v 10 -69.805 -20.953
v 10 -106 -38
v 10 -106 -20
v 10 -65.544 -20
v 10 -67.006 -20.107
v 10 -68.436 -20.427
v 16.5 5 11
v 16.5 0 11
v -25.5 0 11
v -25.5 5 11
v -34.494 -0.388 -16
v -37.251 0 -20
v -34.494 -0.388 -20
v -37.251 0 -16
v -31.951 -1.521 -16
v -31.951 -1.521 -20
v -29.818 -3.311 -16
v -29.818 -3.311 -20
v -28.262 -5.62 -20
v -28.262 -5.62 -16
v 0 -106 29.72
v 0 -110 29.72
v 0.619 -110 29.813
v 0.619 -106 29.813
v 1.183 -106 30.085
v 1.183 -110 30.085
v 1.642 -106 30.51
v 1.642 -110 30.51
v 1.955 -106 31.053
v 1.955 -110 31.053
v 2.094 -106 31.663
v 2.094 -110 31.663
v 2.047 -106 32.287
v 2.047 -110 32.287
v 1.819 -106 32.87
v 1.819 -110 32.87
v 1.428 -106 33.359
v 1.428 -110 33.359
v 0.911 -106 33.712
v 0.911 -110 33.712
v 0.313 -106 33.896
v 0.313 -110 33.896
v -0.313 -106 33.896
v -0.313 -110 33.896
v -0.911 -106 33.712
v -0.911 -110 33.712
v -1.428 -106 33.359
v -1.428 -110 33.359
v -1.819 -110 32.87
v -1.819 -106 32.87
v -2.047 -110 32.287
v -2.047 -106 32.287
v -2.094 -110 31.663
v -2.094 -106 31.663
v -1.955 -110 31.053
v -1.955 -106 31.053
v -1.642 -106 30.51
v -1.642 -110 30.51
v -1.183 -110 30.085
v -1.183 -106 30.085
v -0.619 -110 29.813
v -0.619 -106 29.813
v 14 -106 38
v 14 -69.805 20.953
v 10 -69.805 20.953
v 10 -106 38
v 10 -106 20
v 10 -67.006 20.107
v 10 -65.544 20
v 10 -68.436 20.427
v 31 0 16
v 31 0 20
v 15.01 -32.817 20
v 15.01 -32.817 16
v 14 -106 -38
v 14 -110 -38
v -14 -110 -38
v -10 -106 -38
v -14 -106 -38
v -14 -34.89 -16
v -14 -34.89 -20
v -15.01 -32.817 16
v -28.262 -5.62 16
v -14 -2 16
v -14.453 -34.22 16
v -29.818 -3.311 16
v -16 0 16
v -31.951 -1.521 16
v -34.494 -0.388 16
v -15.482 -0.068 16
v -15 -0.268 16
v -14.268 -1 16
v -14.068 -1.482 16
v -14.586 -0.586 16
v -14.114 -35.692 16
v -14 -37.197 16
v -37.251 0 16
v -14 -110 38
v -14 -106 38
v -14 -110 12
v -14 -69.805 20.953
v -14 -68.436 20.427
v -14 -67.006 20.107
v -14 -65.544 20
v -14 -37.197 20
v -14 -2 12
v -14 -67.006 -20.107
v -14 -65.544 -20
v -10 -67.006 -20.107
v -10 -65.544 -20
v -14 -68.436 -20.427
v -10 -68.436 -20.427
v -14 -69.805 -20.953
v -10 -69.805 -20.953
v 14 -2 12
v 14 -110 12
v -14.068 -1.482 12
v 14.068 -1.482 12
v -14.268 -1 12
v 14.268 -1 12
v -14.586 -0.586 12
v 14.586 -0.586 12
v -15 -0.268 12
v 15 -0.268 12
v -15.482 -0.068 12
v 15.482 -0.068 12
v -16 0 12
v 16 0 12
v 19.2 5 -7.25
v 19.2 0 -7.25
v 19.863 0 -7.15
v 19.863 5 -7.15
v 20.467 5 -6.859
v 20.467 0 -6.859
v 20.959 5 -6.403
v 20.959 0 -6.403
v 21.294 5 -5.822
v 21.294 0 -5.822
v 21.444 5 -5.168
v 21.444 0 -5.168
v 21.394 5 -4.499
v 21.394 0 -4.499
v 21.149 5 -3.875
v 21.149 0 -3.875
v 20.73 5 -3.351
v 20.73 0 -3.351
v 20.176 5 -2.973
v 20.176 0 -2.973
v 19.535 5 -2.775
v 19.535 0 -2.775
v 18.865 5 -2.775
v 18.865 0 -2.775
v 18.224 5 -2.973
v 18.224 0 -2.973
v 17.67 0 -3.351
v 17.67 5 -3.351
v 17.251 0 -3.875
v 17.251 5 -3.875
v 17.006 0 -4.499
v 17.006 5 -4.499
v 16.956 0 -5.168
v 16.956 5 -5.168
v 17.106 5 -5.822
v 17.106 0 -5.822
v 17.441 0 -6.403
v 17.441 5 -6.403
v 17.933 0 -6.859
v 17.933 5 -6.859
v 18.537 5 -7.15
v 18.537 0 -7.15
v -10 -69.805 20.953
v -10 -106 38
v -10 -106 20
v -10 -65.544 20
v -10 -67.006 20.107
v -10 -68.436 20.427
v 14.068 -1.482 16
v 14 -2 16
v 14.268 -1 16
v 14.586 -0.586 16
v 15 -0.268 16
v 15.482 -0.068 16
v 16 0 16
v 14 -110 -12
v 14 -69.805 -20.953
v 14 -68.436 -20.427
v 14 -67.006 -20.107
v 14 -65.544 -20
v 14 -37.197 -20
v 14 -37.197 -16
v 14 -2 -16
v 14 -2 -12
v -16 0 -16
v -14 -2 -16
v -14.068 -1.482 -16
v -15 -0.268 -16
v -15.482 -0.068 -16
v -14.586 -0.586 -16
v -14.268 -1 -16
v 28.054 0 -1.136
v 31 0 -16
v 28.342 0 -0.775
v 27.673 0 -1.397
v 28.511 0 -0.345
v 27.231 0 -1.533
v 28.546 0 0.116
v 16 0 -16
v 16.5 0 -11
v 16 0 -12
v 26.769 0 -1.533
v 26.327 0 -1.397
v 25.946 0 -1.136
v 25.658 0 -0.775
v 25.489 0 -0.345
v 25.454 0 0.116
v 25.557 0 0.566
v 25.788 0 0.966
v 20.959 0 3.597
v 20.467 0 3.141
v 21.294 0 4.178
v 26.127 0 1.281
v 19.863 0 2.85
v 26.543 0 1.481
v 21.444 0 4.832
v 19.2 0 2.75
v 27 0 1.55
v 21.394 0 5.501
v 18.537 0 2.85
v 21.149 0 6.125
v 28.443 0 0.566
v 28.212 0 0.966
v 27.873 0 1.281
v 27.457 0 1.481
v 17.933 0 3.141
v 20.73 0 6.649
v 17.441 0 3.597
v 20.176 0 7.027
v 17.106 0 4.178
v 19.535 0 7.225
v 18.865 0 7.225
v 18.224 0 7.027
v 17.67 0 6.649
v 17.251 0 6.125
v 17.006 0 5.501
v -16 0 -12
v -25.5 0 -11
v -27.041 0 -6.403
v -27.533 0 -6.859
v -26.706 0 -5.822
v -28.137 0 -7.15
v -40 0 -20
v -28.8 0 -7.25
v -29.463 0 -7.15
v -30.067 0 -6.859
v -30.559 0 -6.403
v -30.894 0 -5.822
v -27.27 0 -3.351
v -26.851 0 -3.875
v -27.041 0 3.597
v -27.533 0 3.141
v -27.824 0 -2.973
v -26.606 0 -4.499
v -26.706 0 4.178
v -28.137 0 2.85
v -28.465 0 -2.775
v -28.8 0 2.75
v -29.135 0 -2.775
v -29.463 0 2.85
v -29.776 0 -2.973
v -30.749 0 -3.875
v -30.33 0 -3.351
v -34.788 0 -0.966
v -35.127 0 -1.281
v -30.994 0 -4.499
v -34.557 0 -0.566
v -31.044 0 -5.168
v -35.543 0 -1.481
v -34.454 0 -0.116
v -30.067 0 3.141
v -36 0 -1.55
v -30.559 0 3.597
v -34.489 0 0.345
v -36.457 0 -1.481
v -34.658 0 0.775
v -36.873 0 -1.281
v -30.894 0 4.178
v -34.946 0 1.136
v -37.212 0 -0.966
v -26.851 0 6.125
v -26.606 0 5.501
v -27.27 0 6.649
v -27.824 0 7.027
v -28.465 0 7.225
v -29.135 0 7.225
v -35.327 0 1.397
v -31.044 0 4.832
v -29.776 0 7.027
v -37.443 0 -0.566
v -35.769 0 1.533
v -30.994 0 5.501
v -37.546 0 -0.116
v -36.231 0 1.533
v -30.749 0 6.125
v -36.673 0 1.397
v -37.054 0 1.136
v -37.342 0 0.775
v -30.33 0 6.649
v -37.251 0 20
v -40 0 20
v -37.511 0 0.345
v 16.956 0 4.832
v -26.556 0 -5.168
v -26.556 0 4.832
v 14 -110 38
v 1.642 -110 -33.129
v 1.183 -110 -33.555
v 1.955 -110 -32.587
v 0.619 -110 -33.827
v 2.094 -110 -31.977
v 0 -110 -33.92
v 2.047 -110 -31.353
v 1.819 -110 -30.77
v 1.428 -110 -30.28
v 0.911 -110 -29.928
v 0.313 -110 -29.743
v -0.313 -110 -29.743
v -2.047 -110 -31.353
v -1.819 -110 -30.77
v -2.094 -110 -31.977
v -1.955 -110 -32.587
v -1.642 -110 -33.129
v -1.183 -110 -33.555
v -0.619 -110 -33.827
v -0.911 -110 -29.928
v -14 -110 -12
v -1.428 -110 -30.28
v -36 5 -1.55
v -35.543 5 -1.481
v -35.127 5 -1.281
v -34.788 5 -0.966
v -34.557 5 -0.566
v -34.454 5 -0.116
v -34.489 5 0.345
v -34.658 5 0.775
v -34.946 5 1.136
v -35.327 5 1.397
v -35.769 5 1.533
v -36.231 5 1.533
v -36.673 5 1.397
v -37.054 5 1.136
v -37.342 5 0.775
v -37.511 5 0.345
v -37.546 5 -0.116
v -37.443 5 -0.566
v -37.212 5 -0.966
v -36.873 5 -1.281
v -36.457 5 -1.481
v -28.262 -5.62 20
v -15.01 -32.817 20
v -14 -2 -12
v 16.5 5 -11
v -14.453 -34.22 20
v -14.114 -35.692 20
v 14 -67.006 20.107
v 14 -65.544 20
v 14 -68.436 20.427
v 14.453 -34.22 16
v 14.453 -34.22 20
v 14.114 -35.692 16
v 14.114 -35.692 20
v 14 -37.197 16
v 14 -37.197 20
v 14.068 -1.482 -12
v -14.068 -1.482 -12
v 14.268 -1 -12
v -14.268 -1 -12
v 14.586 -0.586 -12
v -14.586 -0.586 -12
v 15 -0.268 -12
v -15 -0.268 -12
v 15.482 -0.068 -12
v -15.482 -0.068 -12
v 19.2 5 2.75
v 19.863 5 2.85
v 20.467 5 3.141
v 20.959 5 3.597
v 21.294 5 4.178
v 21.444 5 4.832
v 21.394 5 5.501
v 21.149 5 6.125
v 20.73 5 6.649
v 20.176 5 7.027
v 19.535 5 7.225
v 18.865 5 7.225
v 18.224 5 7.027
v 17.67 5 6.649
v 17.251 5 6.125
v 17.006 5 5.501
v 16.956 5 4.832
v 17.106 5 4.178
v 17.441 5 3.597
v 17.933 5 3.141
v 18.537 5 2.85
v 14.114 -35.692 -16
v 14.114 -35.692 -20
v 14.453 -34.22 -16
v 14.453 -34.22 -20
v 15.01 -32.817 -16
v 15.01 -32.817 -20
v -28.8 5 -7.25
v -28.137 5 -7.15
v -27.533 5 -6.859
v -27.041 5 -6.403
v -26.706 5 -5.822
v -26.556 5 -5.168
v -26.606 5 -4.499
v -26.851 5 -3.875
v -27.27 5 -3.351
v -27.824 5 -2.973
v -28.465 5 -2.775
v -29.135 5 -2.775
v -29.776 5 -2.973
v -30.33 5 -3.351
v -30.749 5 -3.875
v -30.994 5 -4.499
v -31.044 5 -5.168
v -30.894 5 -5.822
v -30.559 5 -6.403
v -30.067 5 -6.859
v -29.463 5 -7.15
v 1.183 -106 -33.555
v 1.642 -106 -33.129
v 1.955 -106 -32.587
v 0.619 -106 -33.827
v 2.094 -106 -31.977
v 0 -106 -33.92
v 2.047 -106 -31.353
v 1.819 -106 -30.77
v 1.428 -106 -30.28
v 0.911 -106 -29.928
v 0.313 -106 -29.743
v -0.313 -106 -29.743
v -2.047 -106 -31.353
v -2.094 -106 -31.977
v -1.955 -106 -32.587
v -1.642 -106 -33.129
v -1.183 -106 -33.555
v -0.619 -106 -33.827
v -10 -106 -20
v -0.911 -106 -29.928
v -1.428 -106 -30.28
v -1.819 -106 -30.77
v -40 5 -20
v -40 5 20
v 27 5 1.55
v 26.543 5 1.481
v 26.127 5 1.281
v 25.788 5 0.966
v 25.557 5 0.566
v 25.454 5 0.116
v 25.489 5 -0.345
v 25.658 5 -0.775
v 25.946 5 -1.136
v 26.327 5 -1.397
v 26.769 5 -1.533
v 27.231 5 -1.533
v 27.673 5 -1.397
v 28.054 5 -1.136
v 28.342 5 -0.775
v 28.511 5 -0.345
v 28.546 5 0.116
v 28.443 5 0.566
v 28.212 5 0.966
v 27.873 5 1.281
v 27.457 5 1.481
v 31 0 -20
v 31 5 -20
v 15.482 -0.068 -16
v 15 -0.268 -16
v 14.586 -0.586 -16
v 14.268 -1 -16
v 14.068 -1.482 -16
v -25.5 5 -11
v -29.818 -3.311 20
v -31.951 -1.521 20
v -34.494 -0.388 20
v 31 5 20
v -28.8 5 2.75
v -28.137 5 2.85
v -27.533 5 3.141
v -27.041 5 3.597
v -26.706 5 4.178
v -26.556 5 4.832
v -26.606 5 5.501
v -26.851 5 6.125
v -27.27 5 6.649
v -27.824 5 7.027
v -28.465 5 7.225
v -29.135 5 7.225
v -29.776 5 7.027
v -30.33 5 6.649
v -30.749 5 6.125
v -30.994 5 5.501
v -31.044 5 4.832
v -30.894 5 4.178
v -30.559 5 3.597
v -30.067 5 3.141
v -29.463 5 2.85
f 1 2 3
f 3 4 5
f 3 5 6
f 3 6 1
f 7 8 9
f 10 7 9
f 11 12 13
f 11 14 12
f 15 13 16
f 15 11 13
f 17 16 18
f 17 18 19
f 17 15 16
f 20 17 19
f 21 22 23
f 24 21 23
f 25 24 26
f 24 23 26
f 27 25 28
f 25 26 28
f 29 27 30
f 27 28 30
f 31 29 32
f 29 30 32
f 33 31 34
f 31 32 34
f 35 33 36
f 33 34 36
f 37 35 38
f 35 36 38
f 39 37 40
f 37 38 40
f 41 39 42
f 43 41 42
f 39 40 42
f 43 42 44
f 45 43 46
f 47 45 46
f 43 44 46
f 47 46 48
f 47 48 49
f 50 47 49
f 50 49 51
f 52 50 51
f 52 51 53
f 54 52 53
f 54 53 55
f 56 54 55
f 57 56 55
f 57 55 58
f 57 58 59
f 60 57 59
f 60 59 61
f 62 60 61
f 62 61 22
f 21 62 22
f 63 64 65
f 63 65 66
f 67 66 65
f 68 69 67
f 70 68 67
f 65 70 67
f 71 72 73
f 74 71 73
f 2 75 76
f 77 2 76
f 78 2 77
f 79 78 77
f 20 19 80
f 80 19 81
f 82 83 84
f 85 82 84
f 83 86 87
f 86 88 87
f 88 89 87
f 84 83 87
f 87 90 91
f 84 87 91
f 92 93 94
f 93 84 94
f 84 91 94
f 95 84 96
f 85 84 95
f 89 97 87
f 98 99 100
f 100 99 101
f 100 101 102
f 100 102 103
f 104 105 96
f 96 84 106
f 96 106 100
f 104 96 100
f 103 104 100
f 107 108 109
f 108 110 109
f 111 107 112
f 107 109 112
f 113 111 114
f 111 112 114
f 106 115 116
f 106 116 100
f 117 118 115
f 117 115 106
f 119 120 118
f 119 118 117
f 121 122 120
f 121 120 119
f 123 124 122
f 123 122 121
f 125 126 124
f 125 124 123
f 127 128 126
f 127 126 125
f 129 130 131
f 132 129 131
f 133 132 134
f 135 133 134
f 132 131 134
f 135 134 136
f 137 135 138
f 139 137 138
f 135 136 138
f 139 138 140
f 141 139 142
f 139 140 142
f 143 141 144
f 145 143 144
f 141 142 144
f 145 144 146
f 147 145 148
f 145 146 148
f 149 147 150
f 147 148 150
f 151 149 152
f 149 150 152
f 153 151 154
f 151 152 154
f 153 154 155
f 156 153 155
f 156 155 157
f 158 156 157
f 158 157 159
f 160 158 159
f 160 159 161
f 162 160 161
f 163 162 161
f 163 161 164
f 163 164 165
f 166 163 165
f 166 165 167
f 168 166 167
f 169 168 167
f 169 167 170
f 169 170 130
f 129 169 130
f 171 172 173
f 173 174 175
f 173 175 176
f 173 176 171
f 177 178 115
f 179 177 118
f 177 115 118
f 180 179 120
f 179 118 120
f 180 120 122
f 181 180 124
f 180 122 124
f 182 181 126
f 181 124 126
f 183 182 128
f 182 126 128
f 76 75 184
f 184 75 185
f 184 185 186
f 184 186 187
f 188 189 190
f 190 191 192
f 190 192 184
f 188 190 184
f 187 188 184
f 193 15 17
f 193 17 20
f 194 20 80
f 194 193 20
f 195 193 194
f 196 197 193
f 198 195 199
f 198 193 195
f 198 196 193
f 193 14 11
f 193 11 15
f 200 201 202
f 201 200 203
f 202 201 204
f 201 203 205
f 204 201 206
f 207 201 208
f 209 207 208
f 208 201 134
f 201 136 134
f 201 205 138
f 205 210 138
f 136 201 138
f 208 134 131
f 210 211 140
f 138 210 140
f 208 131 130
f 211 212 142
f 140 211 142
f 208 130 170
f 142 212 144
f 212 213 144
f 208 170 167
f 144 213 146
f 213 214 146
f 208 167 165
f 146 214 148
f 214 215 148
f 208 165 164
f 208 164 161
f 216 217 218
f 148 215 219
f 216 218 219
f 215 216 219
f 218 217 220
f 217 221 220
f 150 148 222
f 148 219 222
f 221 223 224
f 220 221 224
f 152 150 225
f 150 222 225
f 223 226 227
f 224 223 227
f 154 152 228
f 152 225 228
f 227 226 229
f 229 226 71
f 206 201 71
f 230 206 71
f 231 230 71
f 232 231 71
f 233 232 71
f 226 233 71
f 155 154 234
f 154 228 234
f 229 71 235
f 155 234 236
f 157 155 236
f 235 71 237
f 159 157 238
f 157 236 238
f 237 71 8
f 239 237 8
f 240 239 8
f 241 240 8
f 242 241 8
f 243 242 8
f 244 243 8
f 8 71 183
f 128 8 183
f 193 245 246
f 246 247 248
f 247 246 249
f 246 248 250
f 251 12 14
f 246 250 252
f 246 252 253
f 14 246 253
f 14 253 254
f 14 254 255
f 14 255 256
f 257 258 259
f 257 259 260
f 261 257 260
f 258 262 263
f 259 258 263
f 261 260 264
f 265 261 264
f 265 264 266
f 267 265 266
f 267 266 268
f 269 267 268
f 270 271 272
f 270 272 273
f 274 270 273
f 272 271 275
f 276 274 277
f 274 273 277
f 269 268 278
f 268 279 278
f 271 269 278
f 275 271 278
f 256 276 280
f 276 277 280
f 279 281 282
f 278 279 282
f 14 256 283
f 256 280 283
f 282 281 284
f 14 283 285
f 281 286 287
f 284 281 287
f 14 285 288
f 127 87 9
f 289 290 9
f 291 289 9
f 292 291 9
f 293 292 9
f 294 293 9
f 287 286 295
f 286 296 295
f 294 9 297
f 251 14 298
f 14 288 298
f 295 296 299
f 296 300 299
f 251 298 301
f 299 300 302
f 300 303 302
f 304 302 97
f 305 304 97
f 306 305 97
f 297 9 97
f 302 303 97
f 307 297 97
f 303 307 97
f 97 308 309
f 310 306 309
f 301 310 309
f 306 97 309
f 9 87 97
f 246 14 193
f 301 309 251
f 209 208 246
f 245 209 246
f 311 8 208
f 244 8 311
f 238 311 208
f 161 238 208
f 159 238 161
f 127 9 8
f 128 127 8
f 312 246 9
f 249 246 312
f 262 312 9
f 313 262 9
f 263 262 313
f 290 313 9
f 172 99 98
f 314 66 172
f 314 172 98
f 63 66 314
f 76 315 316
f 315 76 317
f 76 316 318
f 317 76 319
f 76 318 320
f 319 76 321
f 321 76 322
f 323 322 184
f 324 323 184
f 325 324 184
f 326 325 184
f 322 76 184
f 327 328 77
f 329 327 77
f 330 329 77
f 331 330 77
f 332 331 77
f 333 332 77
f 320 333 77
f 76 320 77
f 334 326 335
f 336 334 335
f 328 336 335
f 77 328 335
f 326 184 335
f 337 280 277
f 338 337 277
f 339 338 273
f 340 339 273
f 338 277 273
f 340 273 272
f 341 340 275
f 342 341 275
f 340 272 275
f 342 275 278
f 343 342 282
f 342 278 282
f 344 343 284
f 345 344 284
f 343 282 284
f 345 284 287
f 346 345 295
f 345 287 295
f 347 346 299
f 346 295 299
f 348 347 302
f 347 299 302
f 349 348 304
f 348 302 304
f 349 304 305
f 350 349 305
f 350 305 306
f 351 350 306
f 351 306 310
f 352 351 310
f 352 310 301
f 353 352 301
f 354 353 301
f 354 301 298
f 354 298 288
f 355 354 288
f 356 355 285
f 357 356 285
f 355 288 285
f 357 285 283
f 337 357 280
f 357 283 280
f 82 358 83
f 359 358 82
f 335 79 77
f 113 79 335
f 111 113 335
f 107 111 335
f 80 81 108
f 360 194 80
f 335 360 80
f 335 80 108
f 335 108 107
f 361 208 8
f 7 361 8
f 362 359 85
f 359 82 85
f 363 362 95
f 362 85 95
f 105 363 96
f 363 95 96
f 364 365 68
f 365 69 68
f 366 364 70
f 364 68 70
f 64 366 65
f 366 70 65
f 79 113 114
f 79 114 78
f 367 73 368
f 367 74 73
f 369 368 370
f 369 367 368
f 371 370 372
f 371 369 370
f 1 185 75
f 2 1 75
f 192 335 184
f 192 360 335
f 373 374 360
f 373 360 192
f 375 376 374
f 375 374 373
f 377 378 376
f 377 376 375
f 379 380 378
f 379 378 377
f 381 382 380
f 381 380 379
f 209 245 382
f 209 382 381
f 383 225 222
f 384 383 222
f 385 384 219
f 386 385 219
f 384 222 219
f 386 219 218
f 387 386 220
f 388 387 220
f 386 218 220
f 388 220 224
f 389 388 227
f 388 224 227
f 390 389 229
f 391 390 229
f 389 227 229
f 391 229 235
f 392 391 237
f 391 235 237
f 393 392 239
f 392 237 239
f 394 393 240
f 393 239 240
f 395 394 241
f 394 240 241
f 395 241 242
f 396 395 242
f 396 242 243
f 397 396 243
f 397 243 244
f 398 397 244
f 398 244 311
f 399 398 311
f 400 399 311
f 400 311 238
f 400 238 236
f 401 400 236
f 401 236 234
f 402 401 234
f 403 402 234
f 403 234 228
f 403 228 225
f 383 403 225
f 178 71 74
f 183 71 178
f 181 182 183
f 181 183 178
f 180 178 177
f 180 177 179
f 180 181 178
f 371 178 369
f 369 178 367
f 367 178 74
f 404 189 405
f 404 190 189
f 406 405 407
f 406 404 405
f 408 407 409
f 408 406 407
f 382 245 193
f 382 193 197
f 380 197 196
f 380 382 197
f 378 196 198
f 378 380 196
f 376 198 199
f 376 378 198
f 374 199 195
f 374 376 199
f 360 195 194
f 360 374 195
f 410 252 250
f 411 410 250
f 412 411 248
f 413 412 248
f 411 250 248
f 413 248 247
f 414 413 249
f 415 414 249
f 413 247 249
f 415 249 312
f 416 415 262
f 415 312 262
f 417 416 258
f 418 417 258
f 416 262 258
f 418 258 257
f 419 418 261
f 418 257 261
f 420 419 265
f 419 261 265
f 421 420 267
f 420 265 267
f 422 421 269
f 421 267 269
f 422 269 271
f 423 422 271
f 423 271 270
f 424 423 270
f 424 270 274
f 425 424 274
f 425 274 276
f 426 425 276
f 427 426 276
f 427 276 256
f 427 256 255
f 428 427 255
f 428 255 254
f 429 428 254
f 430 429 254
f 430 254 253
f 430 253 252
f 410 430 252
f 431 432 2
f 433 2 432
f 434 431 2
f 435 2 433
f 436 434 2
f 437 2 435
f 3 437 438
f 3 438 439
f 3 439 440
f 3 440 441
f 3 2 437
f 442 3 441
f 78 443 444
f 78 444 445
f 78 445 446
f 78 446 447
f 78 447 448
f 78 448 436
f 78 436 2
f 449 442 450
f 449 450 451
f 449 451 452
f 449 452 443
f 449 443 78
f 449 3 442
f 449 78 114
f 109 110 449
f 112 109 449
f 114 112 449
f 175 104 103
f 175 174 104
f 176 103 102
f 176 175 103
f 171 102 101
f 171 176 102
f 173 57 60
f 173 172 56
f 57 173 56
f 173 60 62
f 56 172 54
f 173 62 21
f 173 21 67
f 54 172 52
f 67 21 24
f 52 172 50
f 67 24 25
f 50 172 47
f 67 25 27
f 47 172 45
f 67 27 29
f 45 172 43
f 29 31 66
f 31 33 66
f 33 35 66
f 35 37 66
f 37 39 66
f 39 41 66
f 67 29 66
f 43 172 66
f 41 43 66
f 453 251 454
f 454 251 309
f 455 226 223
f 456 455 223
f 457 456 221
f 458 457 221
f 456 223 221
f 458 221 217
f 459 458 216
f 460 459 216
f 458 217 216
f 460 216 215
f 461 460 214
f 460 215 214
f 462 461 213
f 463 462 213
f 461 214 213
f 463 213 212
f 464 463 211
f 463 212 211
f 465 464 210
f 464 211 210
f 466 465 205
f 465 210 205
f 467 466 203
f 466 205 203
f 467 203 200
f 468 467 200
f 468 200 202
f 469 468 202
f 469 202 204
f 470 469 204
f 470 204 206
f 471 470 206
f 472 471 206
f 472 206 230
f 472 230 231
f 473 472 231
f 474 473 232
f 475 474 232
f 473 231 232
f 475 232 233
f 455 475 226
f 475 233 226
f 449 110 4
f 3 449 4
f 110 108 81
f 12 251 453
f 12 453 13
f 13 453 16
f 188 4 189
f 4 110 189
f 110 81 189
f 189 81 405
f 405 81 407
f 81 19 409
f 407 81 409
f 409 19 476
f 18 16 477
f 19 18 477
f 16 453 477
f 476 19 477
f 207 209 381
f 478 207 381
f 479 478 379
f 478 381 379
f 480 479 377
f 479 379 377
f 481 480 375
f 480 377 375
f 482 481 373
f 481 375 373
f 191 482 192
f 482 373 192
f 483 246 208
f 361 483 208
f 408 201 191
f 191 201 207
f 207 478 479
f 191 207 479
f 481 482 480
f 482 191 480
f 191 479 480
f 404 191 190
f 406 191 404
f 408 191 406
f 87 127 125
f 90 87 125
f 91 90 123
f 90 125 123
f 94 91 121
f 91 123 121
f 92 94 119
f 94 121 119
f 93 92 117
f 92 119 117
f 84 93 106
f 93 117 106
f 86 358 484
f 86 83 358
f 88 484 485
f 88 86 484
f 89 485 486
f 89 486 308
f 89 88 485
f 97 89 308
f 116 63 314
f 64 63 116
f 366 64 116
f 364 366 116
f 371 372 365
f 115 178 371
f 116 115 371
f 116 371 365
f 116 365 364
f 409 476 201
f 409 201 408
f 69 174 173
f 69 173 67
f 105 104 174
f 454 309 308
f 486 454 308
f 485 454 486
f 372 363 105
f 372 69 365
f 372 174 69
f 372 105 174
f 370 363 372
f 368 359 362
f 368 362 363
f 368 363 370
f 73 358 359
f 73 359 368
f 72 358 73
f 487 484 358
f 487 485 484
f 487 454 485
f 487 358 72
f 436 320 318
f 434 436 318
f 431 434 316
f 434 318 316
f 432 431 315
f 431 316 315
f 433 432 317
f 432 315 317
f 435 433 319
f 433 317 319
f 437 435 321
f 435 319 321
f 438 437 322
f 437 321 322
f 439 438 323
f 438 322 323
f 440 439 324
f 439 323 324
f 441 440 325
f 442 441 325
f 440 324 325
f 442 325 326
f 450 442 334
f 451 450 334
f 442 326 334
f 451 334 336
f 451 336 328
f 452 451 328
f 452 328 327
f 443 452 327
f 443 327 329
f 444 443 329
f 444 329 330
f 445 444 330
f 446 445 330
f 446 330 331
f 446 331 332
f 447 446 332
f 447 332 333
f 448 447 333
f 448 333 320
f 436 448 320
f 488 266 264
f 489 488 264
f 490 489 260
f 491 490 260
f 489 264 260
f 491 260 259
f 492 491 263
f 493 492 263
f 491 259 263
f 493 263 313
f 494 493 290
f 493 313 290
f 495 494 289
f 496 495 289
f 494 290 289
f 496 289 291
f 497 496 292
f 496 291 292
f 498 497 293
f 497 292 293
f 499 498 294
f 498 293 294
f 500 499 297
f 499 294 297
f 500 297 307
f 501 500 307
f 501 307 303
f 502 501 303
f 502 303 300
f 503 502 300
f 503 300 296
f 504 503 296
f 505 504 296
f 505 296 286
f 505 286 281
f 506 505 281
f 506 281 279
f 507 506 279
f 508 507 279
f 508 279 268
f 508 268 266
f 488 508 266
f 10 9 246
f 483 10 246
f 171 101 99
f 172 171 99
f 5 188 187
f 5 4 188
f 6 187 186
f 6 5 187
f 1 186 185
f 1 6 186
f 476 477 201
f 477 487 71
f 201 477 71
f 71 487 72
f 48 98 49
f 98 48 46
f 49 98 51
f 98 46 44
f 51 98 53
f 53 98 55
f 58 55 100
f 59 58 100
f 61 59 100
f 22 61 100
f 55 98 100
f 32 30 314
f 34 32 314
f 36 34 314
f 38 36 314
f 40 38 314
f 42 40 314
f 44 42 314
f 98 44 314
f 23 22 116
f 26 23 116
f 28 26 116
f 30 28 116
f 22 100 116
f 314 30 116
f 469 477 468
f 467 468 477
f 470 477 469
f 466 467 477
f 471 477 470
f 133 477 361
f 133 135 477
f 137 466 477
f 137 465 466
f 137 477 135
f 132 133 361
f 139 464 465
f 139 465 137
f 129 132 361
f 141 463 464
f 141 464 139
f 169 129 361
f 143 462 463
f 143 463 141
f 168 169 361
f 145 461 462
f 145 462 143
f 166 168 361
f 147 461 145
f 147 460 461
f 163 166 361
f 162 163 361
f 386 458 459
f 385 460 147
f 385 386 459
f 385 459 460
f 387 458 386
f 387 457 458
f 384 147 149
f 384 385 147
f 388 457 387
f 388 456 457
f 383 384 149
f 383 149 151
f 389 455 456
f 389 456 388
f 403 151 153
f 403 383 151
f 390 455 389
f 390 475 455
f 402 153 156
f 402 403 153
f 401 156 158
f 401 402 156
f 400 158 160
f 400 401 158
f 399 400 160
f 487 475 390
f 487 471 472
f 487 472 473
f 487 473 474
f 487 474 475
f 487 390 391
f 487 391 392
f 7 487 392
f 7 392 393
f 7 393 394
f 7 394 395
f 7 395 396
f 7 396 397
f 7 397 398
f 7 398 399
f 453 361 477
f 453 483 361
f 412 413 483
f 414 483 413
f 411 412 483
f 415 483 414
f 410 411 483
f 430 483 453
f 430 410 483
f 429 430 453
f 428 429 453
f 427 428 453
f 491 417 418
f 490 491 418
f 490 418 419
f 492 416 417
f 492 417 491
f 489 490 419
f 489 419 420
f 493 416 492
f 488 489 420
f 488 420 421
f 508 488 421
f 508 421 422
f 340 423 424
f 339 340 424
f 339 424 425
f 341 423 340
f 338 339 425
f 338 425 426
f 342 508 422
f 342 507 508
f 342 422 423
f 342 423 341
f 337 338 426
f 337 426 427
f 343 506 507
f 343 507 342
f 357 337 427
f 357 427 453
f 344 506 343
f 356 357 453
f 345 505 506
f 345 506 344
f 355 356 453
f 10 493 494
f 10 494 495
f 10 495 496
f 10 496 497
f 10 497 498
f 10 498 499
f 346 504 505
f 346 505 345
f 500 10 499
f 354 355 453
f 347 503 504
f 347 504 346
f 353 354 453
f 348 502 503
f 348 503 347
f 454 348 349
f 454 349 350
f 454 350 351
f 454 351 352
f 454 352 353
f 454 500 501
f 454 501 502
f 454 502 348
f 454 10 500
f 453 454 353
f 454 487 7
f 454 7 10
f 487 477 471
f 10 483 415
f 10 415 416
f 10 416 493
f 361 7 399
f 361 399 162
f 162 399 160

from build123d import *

# Parameters (mm, degrees)
SKETCH_1_W                                = 36
SKETCH_1_H                                = 30
EXTRUDE_1_DEPTH                           = 5
SKETCH_11_W                               = 36
SKETCH_11_H                               = 8
EXTRUDE_3_DEPTH                           = 110
SKETCH_12_W                               = 36
SKETCH_12_H                               = 8
EXTRUDE_4_DEPTH                           = 4
SKETCH_17_W                               = 36
SKETCH_17_H                               = 5
EXTRUDE_5_DEPTH                           = 8
SKETCH_18_W                               = 36
SKETCH_18_H                               = 5
EXTRUDE_6_DEPTH                           = 8
SKETCH_20_W                               = 36
SKETCH_20_H                               = 4
EXTRUDE_7_DEPTH                           = 15
SKETCH_21_W                               = 36
SKETCH_21_H                               = 4
EXTRUDE_8_DEPTH                           = 15
CUT_EXTRUDE_8_REACH                       = 124.446
SKETCH_22_R                               = 2.1
CUT_EXTRUDE_9_REACH                       = 124.446
SKETCH_23_R                               = 1.55
CUT_EXTRUDE_10_REACH                      = 119.762
SKETCH_26_R                               = 1
SKETCH_26_W                               = 23.5
SKETCH_26_H                               = 12
CUT_EXTRUDE_11_DEPTH                      = 2
CUT_EXTRUDE_12_DEPTH                      = 2
CUT_EXTRUDE_13_DEPTH                      = 2
CUT_EXTRUDE_14_DEPTH                      = 2
SKETCH_32_W                               = 28
SKETCH_32_H                               = 106
CUT_EXTRUDE_15_DEPTH                      = 2
SKETCH_33_W                               = 28
SKETCH_33_H                               = 106
CUT_EXTRUDE_16_DEPTH                      = 2
EXTRUDE_START                             = 2
SKETCH_34_W                               = 32
SKETCH_34_H                               = 14.000594261
SKETCH_34_R                               = 1
SKETCH_34_W_2                             = 23.5
SKETCH_34_H_2                             = 12
EXTRUDE_12_DEPTH                          = 2
CUT_EXTRUDE_START                         = -2
CUT_EXTRUDE_17_OUTLINE_R                  = 1
CUT_EXTRUDE_17_OUTLINE_W                  = 23.5
CUT_EXTRUDE_17_OUTLINE_H                  = 12
CUT_EXTRUDE_17_DEPTH                      = 2
SKETCH_36_W                               = 46
SKETCH_36_H                               = 5
EXTRUDE_13_DEPTH                          = 15
SKETCH_37_W                               = 46
SKETCH_37_H                               = 5
EXTRUDE_14_DEPTH                          = 15
SKETCH_38_R                               = 1.55
CUT_EXTRUDE_18_DEPTH                      = 5
CUT_EXTRUDE_19_REACH                      = 122.437
SKETCH_39_W                               = 62
SKETCH_39_H                               = 10
FILLET_3_R                                = 2
EXTRUDE_15_DEPTH                          = 7
EXTRUDE_16_DEPTH                          = 7
CUT_EXTRUDE_20_DEPTH                      = 5
CUT_EXTRUDE_21_DEPTH                      = 5
CUT_EXTRUDE_22_DEPTH                      = 5
SKETCH_46_W                               = 9
SKETCH_46_H                               = 40
SKETCH_46_R                               = 1.55
EXTRUDE_17_DEPTH                          = 5
EXTRUDE_18_DEPTH                          = 5
SKETCH_48_R                               = 2.25
CUT_EXTRUDE_23_DEPTH                      = 10
EXTRUDE_19_DEPTH                          = 4
MIRROR_1_AT_THE_SECOND_PLANE_COPY_1_DEPTH = 4
EXTRUDE_20_DEPTH                          = 4
MIRROR_2_AT_THE_SECOND_PLANE_COPY_1_DEPTH = 4
FILLET_4_R                                = 10


# Read off the part's stored shape, not the designer's step: 切除-拉伸17
with BuildPart() as part:
    # 草图1 → 凸台-拉伸1 (new body)
    with BuildSketch(Plane(origin=(0, 0, 0), x_dir=(1, 0, 0), z_dir=(0, 1, 0))):
        Rectangle(SKETCH_1_W, SKETCH_1_H)
    extrude(amount=EXTRUDE_1_DEPTH)

    # 草图11 → 凸台-拉伸3 (add)
    with BuildSketch(Plane.XZ):
        with Locations((0, 11)):
            Rectangle(SKETCH_11_W, SKETCH_11_H)
        with Locations((0, -11)):
            Rectangle(SKETCH_11_W, SKETCH_11_H)
    extrude(amount=EXTRUDE_3_DEPTH)

    # 草图12 → 凸台-拉伸4 (add)
    with BuildSketch(Plane.XZ.offset(110)):
        with Locations((0, 19)):
            Rectangle(SKETCH_12_W, SKETCH_12_H)
        with Locations((0, -19)):
            Rectangle(SKETCH_12_W, SKETCH_12_H)
    extrude(amount=-EXTRUDE_4_DEPTH)

    # 草图17 → 凸台-拉伸5 (add)
    with BuildSketch(Plane(origin=(0, 0, -15), x_dir=(-1, 0, 0), z_dir=(0, 0, -1))):
        with Locations((0, 2.5)):
            Rectangle(SKETCH_17_W, SKETCH_17_H)
    extrude(amount=EXTRUDE_5_DEPTH)

    # 草图18 → 凸台-拉伸6 (add)
    with BuildSketch(Plane.XY.offset(15)):
        with Locations((0, 2.5)):
            Rectangle(SKETCH_18_W, SKETCH_18_H)
    extrude(amount=EXTRUDE_6_DEPTH)

    # 草图20 → 凸台-拉伸7 (add)
    with BuildSketch(Plane.XY.offset(23)):
        with Locations((0, -108)):
            Rectangle(SKETCH_20_W, SKETCH_20_H)
    extrude(amount=EXTRUDE_7_DEPTH)

    # 草图21 → 凸台-拉伸8 (add)
    with BuildSketch(Plane(origin=(0, 0, -23), x_dir=(-1, 0, 0), z_dir=(0, 0, -1))):
        with Locations((0, -108)):
            Rectangle(SKETCH_21_W, SKETCH_21_H)
    extrude(amount=EXTRUDE_8_DEPTH)

    # 草图22 → 切除-拉伸8 (cut, up to next)
    with BuildSketch(Plane.XZ.offset(110), mode=Mode.PRIVATE) as cut_extrude_8_sk1:
        with Locations(Location((0, 31.819805155, 0), (0, 0, 270))):
            Circle(SKETCH_22_R)
    cut_extrude_8_tool1 = extrude(cut_extrude_8_sk1.sketch, amount=-CUT_EXTRUDE_8_REACH, mode=Mode.PRIVATE) & part.part
    # 草图22 → 切除-拉伸8 (cut, up to next)
    with BuildSketch(Plane.XZ.offset(110), mode=Mode.PRIVATE) as cut_extrude_8_sk2:
        with Locations(Location((0, -31.819805155, 0), (0, 0, 270))):
            Circle(SKETCH_22_R)
    cut_extrude_8_tool2 = extrude(cut_extrude_8_sk2.sketch, amount=-CUT_EXTRUDE_8_REACH, mode=Mode.PRIVATE) & part.part
    add(cut_extrude_8_tool1.solids().sort_by_distance((0, -110, 31.819805))[0], mode=Mode.SUBTRACT)
    add(cut_extrude_8_tool2.solids().sort_by_distance((0, -110, -31.819805))[0], mode=Mode.SUBTRACT)

    # 草图23 → 切除-拉伸9 (cut, up to next)
    with BuildSketch(Plane(origin=(0, 5, 0), x_dir=(1, 0, 0), z_dir=(0, 1, 0)), mode=Mode.PRIVATE) as cut_extrude_9_sk1:
        with Locations(Location((0, 18, 0), (0, 0, 270))):
            Circle(SKETCH_23_R)
    cut_extrude_9_tool1 = extrude(cut_extrude_9_sk1.sketch, amount=-CUT_EXTRUDE_9_REACH, mode=Mode.PRIVATE) & part.part
    # 草图23 → 切除-拉伸9 (cut, up to next)
    with BuildSketch(Plane(origin=(0, 5, 0), x_dir=(1, 0, 0), z_dir=(0, 1, 0)), mode=Mode.PRIVATE) as cut_extrude_9_sk2:
        with Locations(Location((0, -18, 0), (0, 0, 270))):
            Circle(SKETCH_23_R)
    cut_extrude_9_tool2 = extrude(cut_extrude_9_sk2.sketch, amount=-CUT_EXTRUDE_9_REACH, mode=Mode.PRIVATE) & part.part
    add(cut_extrude_9_tool1.solids().sort_by_distance((0, 5, -18))[0], mode=Mode.SUBTRACT)
    add(cut_extrude_9_tool2.solids().sort_by_distance((0, 5, 18))[0], mode=Mode.SUBTRACT)

    # 草图26 → 切除-拉伸10 (cut, up to next)
    with BuildSketch(Plane(origin=(0, 0, 0), x_dir=(-1, 0, 0), z_dir=(0, -1, 0)), mode=Mode.PRIVATE) as cut_extrude_10_sk1:
        with Locations(Location((-14, 0, 0), (0, 0, 90))):
            Circle(SKETCH_26_R)
    cut_extrude_10_tool1 = extrude(cut_extrude_10_sk1.sketch, amount=-CUT_EXTRUDE_10_REACH, mode=Mode.PRIVATE) & part.part
    # 草图26 → 切除-拉伸10 (cut, up to next)
    with BuildSketch(Plane(origin=(0, 0, 0), x_dir=(-1, 0, 0), z_dir=(0, -1, 0)), mode=Mode.PRIVATE) as cut_extrude_10_sk2:
        with Locations(Location((14, 0, 0), (0, 0, 270))):
            Circle(SKETCH_26_R)
    cut_extrude_10_tool2 = extrude(cut_extrude_10_sk2.sketch, amount=-CUT_EXTRUDE_10_REACH, mode=Mode.PRIVATE) & part.part
    # 草图26 → 切除-拉伸10 (cut, up to next)
    with BuildSketch(Plane(origin=(0, 0, 0), x_dir=(-1, 0, 0), z_dir=(0, -1, 0)), mode=Mode.PRIVATE) as cut_extrude_10_sk3:
        Rectangle(SKETCH_26_W, SKETCH_26_H)
    cut_extrude_10_tool3 = extrude(cut_extrude_10_sk3.sketch, amount=-CUT_EXTRUDE_10_REACH, mode=Mode.PRIVATE) & part.part
    add(cut_extrude_10_tool1.solids().sort_by_distance((14, 0, 0))[0], mode=Mode.SUBTRACT)
    add(cut_extrude_10_tool2.solids().sort_by_distance((-14, 0, 0))[0], mode=Mode.SUBTRACT)
    add(cut_extrude_10_tool3.solids().sort_by_distance((0, 0, 0))[0], mode=Mode.SUBTRACT)

    # 草图28 → 切除-拉伸11 (cut)
    with BuildSketch(Plane(origin=(18, 0, 0), x_dir=(0, 0, -1), z_dir=(1, 0, 0))):
        Polygon((23, 5), (-23, 5), (-23, 0), (-15, 0), (-15, -106), (-38, -106), (-38, -110), (-7, -110), (-7, 0), (7, 0), (7, -110), (38, -110), (38, -106), (15, -106), (15, 0), (23, 0), align=None)
    extrude(amount=-CUT_EXTRUDE_11_DEPTH, mode=Mode.SUBTRACT)

    # 草图29 → 切除-拉伸12 (cut)
    with BuildSketch(Plane.ZY.offset(18)):
        Polygon((23, 5), (-23, 5), (-23, 0), (-15, 0), (-15, -106), (-38, -106), (-38, -110), (-7, -110), (-7, 0), (7, 0), (7, -110), (38, -110), (38, -106), (15, -106), (15, 0), (23, 0), align=None)
    extrude(amount=-CUT_EXTRUDE_12_DEPTH, mode=Mode.SUBTRACT)

    # 草图30 → 切除-拉伸13 (cut)
    with BuildSketch(Plane(origin=(16, 0, 0), x_dir=(0, 0, -1), z_dir=(1, 0, 0))):
        Polygon((-15, 0), (-7, 0), (-7, -110), (-38, -110), (-38, -106), (-15, -106), align=None)
        Polygon((7, 0), (15, 0), (15, -106), (38, -106), (38, -110), (7, -110), align=None)
    extrude(amount=-CUT_EXTRUDE_13_DEPTH, mode=Mode.SUBTRACT)

    # 草图31 → 切除-拉伸14 (cut)
    with BuildSketch(Plane.ZY.offset(16)):
        Polygon((-7, 0), (-7, -110), (-38, -110), (-38, -106), (-15, -106), (-15, 0), align=None)
        Polygon((15, 0), (15, -106), (38, -106), (38, -110), (7, -110), (7, 0), align=None)
    extrude(amount=-CUT_EXTRUDE_14_DEPTH, mode=Mode.SUBTRACT)

    # 草图32 → 切除-拉伸15 (cut)
    with BuildSketch(Plane.XY.offset(15)):
        with Locations((0, -53)):
            Rectangle(SKETCH_32_W, SKETCH_32_H)
    extrude(amount=-CUT_EXTRUDE_15_DEPTH, mode=Mode.SUBTRACT)

    # 草图33 → 切除-拉伸16 (cut)
    with BuildSketch(Plane(origin=(0, 0, -15), x_dir=(-1, 0, 0), z_dir=(0, 0, -1))):
        with Locations((0, -53)):
            Rectangle(SKETCH_33_W, SKETCH_33_H)
    extrude(amount=-CUT_EXTRUDE_16_DEPTH, mode=Mode.SUBTRACT)

    # 草图34 → 凸台-拉伸12 (add)
    with BuildSketch(Plane.XZ.offset(EXTRUDE_START)):
        with Locations((0, 0.000297131)):
            Rectangle(SKETCH_34_W, SKETCH_34_H)
        with Locations(Location((14, 0, 0), (0, 0, 270))):
            Circle(SKETCH_34_R, mode=Mode.SUBTRACT)
        with Locations(Location((-14, 0, 0), (0, 0, 270))):
            Circle(SKETCH_34_R, mode=Mode.SUBTRACT)
        Rectangle(SKETCH_34_W_2, SKETCH_34_H_2, mode=Mode.SUBTRACT)
    extrude(amount=-EXTRUDE_12_DEPTH)

    # 切除-拉伸17 outline → 切除-拉伸17 (cut)
    with BuildSketch(Plane.XZ.offset(2).offset(CUT_EXTRUDE_START)):
        Polygon((-16, -7), (16, -7), (16, 7.000594261), (14, 7.000594261), (14, 7), (-14, 7), (-14, 7.000594261), (-16, 7.000594261), align=None)
        with Locations((-14, 0)):
            Circle(CUT_EXTRUDE_17_OUTLINE_R, mode=Mode.SUBTRACT)
        Rectangle(CUT_EXTRUDE_17_OUTLINE_W, CUT_EXTRUDE_17_OUTLINE_H, mode=Mode.SUBTRACT)
        with Locations((14, 0)):
            Circle(CUT_EXTRUDE_17_OUTLINE_R, mode=Mode.SUBTRACT)
    extrude(amount=CUT_EXTRUDE_17_DEPTH, mode=Mode.SUBTRACT)

    # 草图36 → 凸台-拉伸13 (add)
    with BuildSketch(Plane.ZY.offset(16)):
        with Locations((0, 2.5)):
            Rectangle(SKETCH_36_W, SKETCH_36_H)
    extrude(amount=EXTRUDE_13_DEPTH)

    # 草图37 → 凸台-拉伸14 (add)
    with BuildSketch(Plane(origin=(16, 0, 0), x_dir=(0, 0, -1), z_dir=(1, 0, 0))):
        with Locations((0, 2.5)):
            Rectangle(SKETCH_37_W, SKETCH_37_H)
    extrude(amount=EXTRUDE_14_DEPTH)

    # 草图38 → 切除-拉伸18 (cut)
    with BuildSketch(Plane.XZ):
        with Locations(Location((-27, 0, 0), (0, 0, 270))):
            Circle(SKETCH_38_R)
        with Locations(Location((27, 0, 0), (0, 0, 90))):
            Circle(SKETCH_38_R)
    extrude(amount=-CUT_EXTRUDE_18_DEPTH, mode=Mode.SUBTRACT)

    # 草图39 → 切除-拉伸19 (cut, up to next)
    with BuildSketch(Plane.XZ, mode=Mode.PRIVATE) as cut_extrude_19_sk1:
        with Locations((0, 18)):
            Rectangle(SKETCH_39_W, SKETCH_39_H)
    cut_extrude_19_tool1 = extrude(cut_extrude_19_sk1.sketch, amount=-CUT_EXTRUDE_19_REACH, mode=Mode.PRIVATE) & part.part
    # 草图39 → 切除-拉伸19 (cut, up to next)
    with BuildSketch(Plane.XZ, mode=Mode.PRIVATE) as cut_extrude_19_sk2:
        with Locations((0, -18)):
            Rectangle(SKETCH_39_W, SKETCH_39_H)
    cut_extrude_19_tool2 = extrude(cut_extrude_19_sk2.sketch, amount=-CUT_EXTRUDE_19_REACH, mode=Mode.PRIVATE) & part.part
    add(cut_extrude_19_tool1.solids().sort_by_distance((0, 0, 18))[0], mode=Mode.SUBTRACT)
    add(cut_extrude_19_tool2.solids().sort_by_distance((0, 0, -18))[0], mode=Mode.SUBTRACT)

    # 圆角3
    fillet_3_edges = [part.edges().sort_by_distance(p)[0] for p in [
        (-14, 0, -10),
        (-14, 0, 10),
        (14, 0, -10),
        (14, 0, 10),
    ]]
    fillet(fillet_3_edges, radius=FILLET_3_R)

    # 草图40 → 凸台-拉伸15 (add)
    with BuildSketch(Plane.XY.offset(13)):
        with BuildLine():
            Line((14, -106), (14, -2))
            ThreePointArc((14, -2), (14.585786438, -0.585786438), (16, 0))
            Line((16, 0), (31, 0))
            Line((31, 0), (31, 5))
            Line((31, 5), (-31, 5))
            Line((-31, 5), (-31, 0))
            Line((-31, 0), (-16, 0))
            ThreePointArc((-16, 0), (-14.585786438, -0.585786438), (-14, -2))
            Line((-14, -2), (-14, -106))
            Line((-14, -106), (14, -106))
        make_face()
    extrude(amount=EXTRUDE_15_DEPTH)

    # 草图41 → 凸台-拉伸16 (add)
    with BuildSketch(Plane(origin=(0, 0, -13), x_dir=(-1, 0, 0), z_dir=(0, 0, -1))):
        with BuildLine():
            Line((-31, 0), (-16, 0))
            ThreePointArc((-16, 0), (-14.585786438, -0.585786438), (-14, -2))
            Line((-14, -2), (-14, -106))
            Line((-14, -106), (14, -106))
            Line((14, -106), (14, -2))
            ThreePointArc((14, -2), (14.585786438, -0.585786438), (16, 0))
            Line((16, 0), (31, 0))
            Line((31, 0), (31, 5))
            Line((31, 5), (-31, 5))
            Line((-31, 5), (-31, 0))
        make_face()
    extrude(amount=EXTRUDE_16_DEPTH)

    # 草图42 → 切除-拉伸20 (cut)
    with BuildSketch(Plane(origin=(0, 0, 7), x_dir=(-1, 0, 0), z_dir=(0, 0, -1))):
        with BuildLine():
            Line((14, -110), (14, -2))
            ThreePointArc((14, -2), (14.585786438, -0.585786438), (16, 0))
            Line((16, 0), (-16, 0))
            ThreePointArc((-16, 0), (-14.585786438, -0.585786438), (-14, -2))
            Line((-14, -2), (-14, -110))
            Line((-14, -110), (14, -110))
        make_face()
    extrude(amount=-CUT_EXTRUDE_20_DEPTH, mode=Mode.SUBTRACT)

    # 草图43 → 切除-拉伸21 (cut)
    with BuildSketch(Plane.XY.offset(-7)):
        with BuildLine():
            Line((-14, -110), (14, -110))
            Line((14, -110), (14, -2))
            ThreePointArc((14, -2), (14.585786438, -0.585786438), (16, 0))
            Line((16, 0), (-16, 0))
            ThreePointArc((-16, 0), (-14.585786438, -0.585786438), (-14, -2))
            Line((-14, -2), (-14, -110))
        make_face()
    extrude(amount=-CUT_EXTRUDE_21_DEPTH, mode=Mode.SUBTRACT)

    # 草图45 → 切除-拉伸22 (cut)
    with BuildSketch(Plane.XZ):
        with BuildLine():
            Line((-25.5, -11), (16.5, -11))
            Line((16.5, -11), (16.5, 0))
            Line((16.5, 0), (15, 0))
            ThreePointArc((15, 0), (14, -1), (13, 0))
            Line((13, 0), (11.75, 0))
            Line((11.75, 0), (11.75, -6))
            Line((11.75, -6), (-11.75, -6))
            Line((-11.75, -6), (-11.75, 0))
            Line((-11.75, 0), (-13, 0))
            ThreePointArc((-13, 0), (-14, -1), (-15, 0))
            Line((-15, 0), (-25.45, 0))
            ThreePointArc((-25.45, 0), (-25.462550814, -0.196850197), (-25.5, -0.390512484))
            Line((-25.5, -0.390512484), (-25.5, -11))
        make_face()
        with BuildLine():
            Line((15, 0), (16.5, 0))
            Line((16.5, 0), (16.5, 11))
            Line((16.5, 11), (-25.5, 11))
            Line((-25.5, 11), (-25.5, 0.390512484))
            ThreePointArc((-25.5, 0.390512484), (-25.462550814, 0.196850197), (-25.45, 0))
            Line((-25.45, 0), (-15, 0))
            ThreePointArc((-15, 0), (-14, 1), (-13, 0))
            Line((-13, 0), (-11.75, 0))
            Line((-11.75, 0), (-11.75, 6))
            Line((-11.75, 6), (11.75, 6))
            Line((11.75, 6), (11.75, 0))
            Line((11.75, 0), (13, 0))
            ThreePointArc((13, 0), (14, 1), (15, 0))
        make_face()
    extrude(amount=-CUT_EXTRUDE_22_DEPTH, mode=Mode.SUBTRACT)

    # 草图46 → 凸台-拉伸17 (add)
    with BuildSketch(Plane.XZ):
        with Locations((-35.5, 0)):
            Rectangle(SKETCH_46_W, SKETCH_46_H)
        with Locations(Location((-36, 0, 0), (0, 0, 270))):
            Circle(SKETCH_46_R, mode=Mode.SUBTRACT)
    extrude(amount=-EXTRUDE_17_DEPTH)

    # 草图47 → 凸台-拉伸18 (add)
    with BuildSketch(Plane.XZ):
        with BuildLine():
            Line((-25.5, 0.390512484), (-25.5, -0.390512484))
            ThreePointArc((-25.5, -0.390512484), (-28.55, 0), (-25.5, 0.390512484))
        make_face()
    extrude(amount=-EXTRUDE_18_DEPTH)

    # 草图48 → 切除-拉伸23 (cut)
    with BuildSketch(Plane.XZ):
        with Locations(Location((-28.8, 5, 0), (0, 0, 270))):
            Circle(SKETCH_48_R)
        with Locations(Location((-28.8, -5, 0), (0, 0, 270))):
            Circle(SKETCH_48_R)
        with Locations(Location((19.2, 5, 0), (0, 0, 270))):
            Circle(SKETCH_48_R)
        with Locations(Location((19.2, -5, 0), (0, 0, 270))):
            Circle(SKETCH_48_R)
    extrude(amount=-CUT_EXTRUDE_23_DEPTH, mode=Mode.SUBTRACT)

    # 草图49 → 凸台-拉伸19 (add)
    with BuildSketch(Plane.ZY.offset(14)):
        Polygon((20, -67.780962131), (38, -106), (20, -106), align=None)
    extrude_19 = extrude(amount=-EXTRUDE_19_DEPTH)

    # 镜向1: 凸台-拉伸19 across plane
    add(extrude_19.mirror(Plane(origin=(0, 0, 0), x_dir=(1, 0, 0), z_dir=(0, 0, -1))))

    # 镜向1 at the second plane: 凸台-拉伸19 across plane
    add(extrude_19.mirror(Plane.ZY))

    # 镜向1 at the second plane copy 1 sket → 镜向1 at the second plane copy 1 (add)
    with BuildSketch(Plane(origin=(14, 0, 0), x_dir=(0, 0, -1), z_dir=(1, 0, 0))):
        Polygon((20, -67.780962131), (38, -106), (20, -106), align=None)
    extrude(amount=-MIRROR_1_AT_THE_SECOND_PLANE_COPY_1_DEPTH)

    # 草图50 → 凸台-拉伸20 (add)
    with BuildSketch(Plane(origin=(0, 0, -20), x_dir=(-1, 0, 0), z_dir=(0, 0, -1))):
        Polygon((-31, 0), (-14, -34.890481065), (-14, 1.365552743), align=None)
    extrude_20 = extrude(amount=-EXTRUDE_20_DEPTH)

    # 镜向2: 凸台-拉伸20 across plane
    add(extrude_20.mirror(Plane(origin=(0, 0, 0), x_dir=(1, 0, 0), z_dir=(0, 0, -1))))

    # 镜向2 at the second plane: 凸台-拉伸20 across plane
    add(extrude_20.mirror(Plane.ZY))

    # 镜向2 at the second plane copy 1 sket → 镜向2 at the second plane copy 1 (add)
    with BuildSketch(Plane.XY.offset(20)):
        Polygon((-31, 0), (-14, -34.890481065), (-14, 1.365552743), align=None)
    extrude(amount=-MIRROR_2_AT_THE_SECOND_PLANE_COPY_1_DEPTH)

    # 圆角4
    fillet_4_edges = [part.edges().sort_by_distance(p)[0] for p in [
        (-31, 0, 18),
        (-14, -34.890481065, 18),
        (-12, -67.780962131, 20),
        (12, -67.780962131, 20),
        (-12, -67.780962131, -20),
        (12, -67.780962131, -20),
        (14, -34.890481065, -18),
        (-31, 0, -18),
        (14, -34.890481065, 18),
    ]]
    fillet(fillet_4_edges, radius=FILLET_4_R)


solid = part.part
